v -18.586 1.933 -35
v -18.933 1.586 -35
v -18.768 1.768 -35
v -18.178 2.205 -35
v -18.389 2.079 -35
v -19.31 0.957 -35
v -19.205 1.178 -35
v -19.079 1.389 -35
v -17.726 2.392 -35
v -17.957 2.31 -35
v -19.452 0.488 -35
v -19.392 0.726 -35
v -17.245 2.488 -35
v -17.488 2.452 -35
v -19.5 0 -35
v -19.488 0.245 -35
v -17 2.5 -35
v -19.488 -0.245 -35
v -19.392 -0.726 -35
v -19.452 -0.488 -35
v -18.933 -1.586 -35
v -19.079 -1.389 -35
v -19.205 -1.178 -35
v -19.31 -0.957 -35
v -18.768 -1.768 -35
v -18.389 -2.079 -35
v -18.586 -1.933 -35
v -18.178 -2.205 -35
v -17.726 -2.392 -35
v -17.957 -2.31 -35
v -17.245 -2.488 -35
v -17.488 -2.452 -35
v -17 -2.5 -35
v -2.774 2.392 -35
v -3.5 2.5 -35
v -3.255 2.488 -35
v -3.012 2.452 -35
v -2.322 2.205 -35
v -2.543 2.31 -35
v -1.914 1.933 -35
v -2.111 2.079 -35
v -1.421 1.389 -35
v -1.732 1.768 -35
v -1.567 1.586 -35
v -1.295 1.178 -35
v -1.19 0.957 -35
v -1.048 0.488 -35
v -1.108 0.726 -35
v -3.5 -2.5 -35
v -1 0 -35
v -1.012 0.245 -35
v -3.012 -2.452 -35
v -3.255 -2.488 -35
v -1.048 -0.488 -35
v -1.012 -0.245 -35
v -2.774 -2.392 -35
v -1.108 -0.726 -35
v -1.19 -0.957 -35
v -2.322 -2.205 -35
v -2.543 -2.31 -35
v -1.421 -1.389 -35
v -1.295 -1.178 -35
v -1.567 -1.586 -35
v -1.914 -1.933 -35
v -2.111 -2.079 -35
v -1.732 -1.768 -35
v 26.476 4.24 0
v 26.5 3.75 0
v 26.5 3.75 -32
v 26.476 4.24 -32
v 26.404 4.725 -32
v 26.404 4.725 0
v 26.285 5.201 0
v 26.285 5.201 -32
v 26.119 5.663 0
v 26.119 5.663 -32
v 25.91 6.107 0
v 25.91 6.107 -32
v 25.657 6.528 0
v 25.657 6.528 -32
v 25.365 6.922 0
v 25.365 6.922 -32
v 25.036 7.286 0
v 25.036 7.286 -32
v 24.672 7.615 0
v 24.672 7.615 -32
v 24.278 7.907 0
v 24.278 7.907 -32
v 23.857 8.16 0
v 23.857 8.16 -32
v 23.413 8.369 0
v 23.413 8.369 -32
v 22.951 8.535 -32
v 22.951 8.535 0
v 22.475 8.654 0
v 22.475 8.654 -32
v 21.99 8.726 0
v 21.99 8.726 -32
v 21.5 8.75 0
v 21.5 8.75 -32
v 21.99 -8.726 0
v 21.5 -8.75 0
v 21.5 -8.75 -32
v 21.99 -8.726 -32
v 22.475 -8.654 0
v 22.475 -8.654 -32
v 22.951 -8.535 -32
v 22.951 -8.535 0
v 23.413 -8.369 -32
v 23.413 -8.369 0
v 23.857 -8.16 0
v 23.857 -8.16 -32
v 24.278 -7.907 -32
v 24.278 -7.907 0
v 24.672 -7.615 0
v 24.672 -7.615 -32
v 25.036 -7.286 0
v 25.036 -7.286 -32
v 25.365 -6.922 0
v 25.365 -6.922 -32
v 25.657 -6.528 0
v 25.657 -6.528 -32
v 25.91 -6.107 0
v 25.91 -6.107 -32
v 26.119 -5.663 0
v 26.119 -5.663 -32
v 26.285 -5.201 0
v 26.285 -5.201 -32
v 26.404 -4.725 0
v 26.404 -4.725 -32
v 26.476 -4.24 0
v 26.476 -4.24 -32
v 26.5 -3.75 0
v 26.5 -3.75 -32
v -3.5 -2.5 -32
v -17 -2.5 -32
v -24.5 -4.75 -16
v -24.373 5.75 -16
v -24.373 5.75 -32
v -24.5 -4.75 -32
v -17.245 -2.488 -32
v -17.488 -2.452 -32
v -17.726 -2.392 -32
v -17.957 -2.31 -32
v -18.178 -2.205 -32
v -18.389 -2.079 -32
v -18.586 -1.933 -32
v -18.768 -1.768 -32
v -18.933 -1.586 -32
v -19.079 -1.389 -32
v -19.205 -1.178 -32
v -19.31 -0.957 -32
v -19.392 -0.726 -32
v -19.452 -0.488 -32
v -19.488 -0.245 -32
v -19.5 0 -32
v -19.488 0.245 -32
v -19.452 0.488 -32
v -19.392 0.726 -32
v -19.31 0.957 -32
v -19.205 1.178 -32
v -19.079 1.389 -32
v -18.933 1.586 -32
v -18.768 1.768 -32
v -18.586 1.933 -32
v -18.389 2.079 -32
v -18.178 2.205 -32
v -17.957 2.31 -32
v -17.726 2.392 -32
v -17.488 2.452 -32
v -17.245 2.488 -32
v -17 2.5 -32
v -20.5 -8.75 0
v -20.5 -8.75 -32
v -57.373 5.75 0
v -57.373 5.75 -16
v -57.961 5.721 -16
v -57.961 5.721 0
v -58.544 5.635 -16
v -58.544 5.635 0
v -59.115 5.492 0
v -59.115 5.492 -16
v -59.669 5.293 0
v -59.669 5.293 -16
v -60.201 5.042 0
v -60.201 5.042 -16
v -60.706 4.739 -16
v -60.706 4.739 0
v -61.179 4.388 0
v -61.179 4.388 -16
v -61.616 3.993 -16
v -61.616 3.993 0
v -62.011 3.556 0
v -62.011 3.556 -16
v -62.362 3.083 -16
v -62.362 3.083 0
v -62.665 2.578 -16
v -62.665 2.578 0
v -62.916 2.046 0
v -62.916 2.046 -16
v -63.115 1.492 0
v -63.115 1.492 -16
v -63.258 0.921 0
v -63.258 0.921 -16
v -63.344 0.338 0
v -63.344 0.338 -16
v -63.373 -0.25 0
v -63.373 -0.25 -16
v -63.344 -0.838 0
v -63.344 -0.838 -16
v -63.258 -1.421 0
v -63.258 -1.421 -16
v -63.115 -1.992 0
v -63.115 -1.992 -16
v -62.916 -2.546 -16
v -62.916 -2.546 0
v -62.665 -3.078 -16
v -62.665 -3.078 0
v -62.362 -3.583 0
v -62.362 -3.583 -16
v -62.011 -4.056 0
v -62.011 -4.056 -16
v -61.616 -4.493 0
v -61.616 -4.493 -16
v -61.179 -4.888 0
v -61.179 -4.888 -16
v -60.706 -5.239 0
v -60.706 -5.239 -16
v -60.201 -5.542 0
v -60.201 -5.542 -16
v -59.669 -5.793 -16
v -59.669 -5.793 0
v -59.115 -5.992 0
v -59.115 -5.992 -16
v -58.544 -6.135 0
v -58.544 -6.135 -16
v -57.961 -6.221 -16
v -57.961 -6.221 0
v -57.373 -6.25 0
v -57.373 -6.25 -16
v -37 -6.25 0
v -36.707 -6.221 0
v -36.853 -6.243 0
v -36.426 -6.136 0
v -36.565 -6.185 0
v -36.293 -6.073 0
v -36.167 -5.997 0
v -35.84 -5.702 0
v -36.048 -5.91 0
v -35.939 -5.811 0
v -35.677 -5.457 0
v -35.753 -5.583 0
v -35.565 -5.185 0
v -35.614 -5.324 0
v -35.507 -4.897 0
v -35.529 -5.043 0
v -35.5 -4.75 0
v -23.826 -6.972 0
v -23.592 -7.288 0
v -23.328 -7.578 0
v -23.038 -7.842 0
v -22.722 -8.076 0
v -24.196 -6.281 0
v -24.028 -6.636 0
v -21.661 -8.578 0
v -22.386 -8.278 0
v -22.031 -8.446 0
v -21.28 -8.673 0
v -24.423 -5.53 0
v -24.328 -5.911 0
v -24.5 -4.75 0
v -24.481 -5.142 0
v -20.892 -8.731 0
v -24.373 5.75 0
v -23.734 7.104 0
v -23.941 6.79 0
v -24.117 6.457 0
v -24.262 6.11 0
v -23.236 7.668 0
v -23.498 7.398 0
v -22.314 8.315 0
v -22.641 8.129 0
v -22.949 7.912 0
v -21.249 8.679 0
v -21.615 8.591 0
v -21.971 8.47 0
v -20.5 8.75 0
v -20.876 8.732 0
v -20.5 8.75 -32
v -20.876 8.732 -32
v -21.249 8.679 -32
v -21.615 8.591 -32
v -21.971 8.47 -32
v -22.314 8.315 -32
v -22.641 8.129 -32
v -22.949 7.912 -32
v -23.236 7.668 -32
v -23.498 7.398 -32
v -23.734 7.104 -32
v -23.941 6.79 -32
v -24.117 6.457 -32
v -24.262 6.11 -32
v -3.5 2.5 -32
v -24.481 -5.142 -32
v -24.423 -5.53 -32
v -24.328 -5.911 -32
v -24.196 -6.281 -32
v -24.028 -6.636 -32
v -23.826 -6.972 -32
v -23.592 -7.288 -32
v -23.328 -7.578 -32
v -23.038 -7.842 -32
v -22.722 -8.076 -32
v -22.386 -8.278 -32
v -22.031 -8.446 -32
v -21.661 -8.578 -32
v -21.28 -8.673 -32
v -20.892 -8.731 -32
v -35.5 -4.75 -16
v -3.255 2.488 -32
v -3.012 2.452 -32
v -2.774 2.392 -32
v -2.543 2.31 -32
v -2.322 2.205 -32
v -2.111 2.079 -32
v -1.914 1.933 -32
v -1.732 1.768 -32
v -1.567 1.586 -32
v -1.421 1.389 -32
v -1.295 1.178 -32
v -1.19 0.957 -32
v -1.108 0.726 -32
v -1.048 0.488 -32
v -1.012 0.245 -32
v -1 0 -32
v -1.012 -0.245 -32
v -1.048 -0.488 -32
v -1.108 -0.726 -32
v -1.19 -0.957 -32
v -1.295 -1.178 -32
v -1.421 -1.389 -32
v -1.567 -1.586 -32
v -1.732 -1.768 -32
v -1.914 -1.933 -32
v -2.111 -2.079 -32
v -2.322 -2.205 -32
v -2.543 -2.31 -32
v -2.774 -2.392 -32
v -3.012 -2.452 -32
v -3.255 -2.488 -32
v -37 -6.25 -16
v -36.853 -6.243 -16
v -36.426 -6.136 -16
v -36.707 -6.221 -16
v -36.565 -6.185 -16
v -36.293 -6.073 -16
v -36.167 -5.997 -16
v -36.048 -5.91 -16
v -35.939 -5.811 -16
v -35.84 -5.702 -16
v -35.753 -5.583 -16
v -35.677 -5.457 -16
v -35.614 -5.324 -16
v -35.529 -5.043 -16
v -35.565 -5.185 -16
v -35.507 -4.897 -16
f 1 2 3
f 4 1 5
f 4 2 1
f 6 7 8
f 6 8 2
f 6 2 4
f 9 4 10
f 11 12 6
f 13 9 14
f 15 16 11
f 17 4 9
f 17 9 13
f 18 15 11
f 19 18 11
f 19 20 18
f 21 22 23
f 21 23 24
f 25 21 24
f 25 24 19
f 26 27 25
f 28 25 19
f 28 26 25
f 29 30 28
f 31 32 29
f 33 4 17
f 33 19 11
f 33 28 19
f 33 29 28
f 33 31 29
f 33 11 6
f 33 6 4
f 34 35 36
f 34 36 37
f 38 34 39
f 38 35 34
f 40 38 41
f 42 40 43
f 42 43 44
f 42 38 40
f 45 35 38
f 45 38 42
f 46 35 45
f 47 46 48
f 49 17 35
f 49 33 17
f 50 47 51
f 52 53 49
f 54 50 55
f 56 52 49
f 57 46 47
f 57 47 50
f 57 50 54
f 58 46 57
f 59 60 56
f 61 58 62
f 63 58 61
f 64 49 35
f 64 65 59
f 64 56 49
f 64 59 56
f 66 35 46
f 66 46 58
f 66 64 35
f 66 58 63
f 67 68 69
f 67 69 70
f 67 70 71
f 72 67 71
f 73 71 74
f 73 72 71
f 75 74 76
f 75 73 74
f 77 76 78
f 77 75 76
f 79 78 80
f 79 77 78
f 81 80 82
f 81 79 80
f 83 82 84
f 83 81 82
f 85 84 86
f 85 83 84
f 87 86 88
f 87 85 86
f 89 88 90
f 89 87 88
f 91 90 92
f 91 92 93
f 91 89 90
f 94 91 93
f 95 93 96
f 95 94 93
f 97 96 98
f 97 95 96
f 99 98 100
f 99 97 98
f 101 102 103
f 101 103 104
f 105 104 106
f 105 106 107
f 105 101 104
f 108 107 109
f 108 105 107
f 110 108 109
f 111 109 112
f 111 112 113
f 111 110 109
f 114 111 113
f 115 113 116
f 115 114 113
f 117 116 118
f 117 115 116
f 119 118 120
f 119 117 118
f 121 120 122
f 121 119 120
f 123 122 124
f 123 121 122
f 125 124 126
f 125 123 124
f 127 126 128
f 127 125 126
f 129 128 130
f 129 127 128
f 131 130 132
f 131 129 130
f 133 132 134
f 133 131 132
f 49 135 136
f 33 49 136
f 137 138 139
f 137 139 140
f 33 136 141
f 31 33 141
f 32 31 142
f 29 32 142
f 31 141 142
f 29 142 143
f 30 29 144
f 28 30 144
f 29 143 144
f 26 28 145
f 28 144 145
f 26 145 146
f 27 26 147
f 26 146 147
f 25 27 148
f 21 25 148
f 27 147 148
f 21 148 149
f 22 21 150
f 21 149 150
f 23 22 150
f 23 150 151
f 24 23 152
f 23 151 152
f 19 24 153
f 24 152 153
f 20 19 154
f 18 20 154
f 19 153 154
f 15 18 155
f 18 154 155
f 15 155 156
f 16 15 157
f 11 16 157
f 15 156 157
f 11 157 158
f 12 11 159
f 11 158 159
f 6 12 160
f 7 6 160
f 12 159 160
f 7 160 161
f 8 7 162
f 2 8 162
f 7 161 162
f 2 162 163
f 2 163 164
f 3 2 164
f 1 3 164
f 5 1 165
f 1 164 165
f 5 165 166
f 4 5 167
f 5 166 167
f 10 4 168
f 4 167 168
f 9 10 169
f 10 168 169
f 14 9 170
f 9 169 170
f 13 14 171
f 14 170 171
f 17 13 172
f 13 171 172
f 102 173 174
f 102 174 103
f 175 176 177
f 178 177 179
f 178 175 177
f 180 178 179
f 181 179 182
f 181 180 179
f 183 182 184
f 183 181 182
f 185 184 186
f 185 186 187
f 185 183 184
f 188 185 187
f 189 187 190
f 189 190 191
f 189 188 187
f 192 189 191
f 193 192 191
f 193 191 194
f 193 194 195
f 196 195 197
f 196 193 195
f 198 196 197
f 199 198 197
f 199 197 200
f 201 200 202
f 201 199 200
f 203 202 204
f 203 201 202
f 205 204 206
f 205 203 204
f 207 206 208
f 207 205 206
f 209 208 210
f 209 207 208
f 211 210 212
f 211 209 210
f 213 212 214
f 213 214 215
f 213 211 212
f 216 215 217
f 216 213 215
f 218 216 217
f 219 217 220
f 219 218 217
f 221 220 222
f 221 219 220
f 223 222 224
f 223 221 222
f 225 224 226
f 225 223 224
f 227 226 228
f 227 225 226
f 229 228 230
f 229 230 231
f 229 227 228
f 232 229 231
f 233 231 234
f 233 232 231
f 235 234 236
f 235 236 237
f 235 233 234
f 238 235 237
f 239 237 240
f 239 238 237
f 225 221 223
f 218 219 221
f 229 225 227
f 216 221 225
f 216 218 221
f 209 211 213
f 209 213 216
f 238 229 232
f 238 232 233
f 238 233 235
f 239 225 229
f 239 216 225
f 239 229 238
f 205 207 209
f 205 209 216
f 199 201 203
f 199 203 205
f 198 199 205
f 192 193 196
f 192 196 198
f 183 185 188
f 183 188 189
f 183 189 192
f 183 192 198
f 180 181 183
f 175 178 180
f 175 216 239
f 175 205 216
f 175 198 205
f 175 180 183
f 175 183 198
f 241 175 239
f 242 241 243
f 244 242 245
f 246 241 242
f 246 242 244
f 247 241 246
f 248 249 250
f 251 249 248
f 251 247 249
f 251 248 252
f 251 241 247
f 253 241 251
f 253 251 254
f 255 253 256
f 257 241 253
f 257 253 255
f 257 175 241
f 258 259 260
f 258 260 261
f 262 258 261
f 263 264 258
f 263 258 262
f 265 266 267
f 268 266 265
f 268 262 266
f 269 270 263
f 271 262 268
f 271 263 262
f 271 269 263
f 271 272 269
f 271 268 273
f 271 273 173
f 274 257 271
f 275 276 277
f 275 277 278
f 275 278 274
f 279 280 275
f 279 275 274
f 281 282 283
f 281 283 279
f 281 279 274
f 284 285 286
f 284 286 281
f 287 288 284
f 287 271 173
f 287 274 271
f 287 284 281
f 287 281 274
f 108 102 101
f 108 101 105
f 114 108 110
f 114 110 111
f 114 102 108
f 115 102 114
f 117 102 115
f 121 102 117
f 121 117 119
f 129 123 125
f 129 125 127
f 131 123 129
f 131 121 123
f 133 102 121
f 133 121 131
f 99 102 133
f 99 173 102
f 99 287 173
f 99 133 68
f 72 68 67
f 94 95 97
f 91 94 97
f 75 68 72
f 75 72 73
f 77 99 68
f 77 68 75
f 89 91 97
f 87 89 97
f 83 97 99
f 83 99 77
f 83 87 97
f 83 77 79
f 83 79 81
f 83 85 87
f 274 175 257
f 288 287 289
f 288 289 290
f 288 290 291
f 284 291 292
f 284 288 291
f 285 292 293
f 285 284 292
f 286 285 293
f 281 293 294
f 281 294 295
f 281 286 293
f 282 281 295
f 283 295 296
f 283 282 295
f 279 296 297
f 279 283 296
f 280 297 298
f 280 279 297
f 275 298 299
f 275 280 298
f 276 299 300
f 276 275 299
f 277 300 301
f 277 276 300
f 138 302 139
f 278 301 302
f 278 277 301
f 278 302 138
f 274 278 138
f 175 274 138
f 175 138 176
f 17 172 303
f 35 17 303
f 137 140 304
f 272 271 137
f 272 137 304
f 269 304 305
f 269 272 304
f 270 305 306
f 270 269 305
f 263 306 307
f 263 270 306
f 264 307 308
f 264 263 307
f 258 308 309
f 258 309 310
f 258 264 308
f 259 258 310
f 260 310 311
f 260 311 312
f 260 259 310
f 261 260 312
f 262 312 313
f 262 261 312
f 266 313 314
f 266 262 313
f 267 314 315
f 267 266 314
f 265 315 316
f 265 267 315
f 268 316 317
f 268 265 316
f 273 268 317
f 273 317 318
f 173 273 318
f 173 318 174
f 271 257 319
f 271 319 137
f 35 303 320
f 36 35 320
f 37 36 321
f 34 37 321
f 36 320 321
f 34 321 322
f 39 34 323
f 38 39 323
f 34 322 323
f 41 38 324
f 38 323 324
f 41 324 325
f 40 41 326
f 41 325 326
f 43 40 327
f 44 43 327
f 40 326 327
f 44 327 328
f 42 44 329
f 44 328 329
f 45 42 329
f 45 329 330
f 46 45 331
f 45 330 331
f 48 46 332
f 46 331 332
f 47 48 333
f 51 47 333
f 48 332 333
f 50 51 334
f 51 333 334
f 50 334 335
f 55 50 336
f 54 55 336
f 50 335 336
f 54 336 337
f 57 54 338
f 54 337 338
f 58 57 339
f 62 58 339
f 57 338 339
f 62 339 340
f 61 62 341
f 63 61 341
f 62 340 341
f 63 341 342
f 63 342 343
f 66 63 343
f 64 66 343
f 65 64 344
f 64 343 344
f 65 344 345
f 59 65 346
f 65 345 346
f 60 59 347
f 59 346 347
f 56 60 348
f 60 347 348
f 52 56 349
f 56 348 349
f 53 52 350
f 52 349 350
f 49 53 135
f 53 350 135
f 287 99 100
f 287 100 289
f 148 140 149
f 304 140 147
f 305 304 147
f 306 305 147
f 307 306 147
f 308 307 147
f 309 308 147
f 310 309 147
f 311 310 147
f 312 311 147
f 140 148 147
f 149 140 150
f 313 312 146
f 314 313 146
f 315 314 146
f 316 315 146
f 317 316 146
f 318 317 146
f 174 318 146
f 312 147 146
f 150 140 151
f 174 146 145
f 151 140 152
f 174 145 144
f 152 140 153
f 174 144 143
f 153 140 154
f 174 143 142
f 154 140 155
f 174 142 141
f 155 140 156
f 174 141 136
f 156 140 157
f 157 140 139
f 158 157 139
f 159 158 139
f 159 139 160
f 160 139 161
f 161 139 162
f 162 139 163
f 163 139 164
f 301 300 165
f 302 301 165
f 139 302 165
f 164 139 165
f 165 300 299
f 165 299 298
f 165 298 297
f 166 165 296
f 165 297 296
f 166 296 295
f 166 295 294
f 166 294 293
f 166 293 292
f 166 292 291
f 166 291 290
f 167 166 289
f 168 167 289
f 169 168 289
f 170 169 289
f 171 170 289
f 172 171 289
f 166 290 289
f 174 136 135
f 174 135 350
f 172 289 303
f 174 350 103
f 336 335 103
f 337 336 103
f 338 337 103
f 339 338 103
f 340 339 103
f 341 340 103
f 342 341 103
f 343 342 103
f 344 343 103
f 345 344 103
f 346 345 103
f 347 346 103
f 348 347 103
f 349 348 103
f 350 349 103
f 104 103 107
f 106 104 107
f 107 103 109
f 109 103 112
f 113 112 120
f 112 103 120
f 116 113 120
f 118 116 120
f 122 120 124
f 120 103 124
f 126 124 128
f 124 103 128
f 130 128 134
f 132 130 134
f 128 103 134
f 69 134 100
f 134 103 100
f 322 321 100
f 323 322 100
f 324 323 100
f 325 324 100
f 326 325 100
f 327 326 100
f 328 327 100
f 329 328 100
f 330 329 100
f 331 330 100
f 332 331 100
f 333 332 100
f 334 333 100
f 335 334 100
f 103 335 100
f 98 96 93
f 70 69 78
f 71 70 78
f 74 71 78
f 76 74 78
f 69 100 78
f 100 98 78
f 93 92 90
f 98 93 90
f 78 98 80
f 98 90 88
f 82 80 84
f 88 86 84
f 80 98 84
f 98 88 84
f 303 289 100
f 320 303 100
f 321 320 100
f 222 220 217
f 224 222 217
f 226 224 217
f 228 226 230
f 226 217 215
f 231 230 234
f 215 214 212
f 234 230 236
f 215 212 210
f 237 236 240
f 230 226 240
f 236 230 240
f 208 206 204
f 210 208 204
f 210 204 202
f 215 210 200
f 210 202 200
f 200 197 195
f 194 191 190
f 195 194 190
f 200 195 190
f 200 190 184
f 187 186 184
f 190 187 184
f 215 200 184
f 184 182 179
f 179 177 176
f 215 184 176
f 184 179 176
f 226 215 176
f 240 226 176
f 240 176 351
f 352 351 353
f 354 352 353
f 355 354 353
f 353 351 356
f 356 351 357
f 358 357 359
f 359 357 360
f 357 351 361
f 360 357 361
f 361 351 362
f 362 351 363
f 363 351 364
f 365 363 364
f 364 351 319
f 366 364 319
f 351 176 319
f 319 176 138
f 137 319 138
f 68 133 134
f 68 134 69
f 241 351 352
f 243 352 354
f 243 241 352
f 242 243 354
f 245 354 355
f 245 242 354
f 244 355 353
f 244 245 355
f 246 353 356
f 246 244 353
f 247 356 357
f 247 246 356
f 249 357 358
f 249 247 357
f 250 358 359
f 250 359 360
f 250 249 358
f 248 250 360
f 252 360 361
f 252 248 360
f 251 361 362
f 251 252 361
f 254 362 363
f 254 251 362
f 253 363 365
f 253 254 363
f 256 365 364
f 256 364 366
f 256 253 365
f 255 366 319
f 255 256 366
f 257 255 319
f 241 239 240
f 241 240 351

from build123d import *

# Parameters (mm, degrees)
F1_DEPTH = 32
F2_DEPTH = 16
F4_DEPTH = 3


with BuildPart() as f1:
    # F0 (on Top) → F1 (new body)
    with BuildSketch(Plane.XY):
        with BuildLine():
            Line((21.5, 8.75), (-20.5, 8.75))
            ThreePointArc((-20.5, 8.75), (-22.94949, 7.912278), (-24.372983, 5.75))
            Line((-24.372983, 5.75), (-24.5, -4.75))
            ThreePointArc((-24.5, -4.75), (-23.328427, -7.578427), (-20.5, -8.75))
            Line((-20.5, -8.75), (21.5, -8.75))
            ThreePointArc((21.5, -8.75), (25.035534, -7.285534), (26.5, -3.75))
            Line((26.5, -3.75), (26.5, 3.75))
            ThreePointArc((26.5, 3.75), (25.035534, 7.285534), (21.5, 8.75))
        make_face()
    extrude(amount=-F1_DEPTH)

    # F0 (on Top) → F2 (join)
    with BuildSketch(Plane.XY):
        with BuildLine():
            Line((-24.5, -4.75), (-24.372983, 5.75))
            Line((-24.372983, 5.75), (-57.372983, 5.75))
            ThreePointArc((-57.372983, 5.75), (-63.372983, -0.25), (-57.372983, -6.25))
            Line((-57.372983, -6.25), (-37, -6.25))
            ThreePointArc((-37, -6.25), (-35.93934, -5.81066), (-35.5, -4.75))
            Line((-35.5, -4.75), (-24.5, -4.75))
        make_face()
    extrude(amount=-F2_DEPTH)

    # F3 (on face) → F4 (join)
    with BuildSketch(Plane(origin=(0, 0, -32), x_dir=(1, 0, 0), z_dir=(0, 0, -1))):
        with BuildLine():
            ThreePointArc((-3.5, -2.5), (-1, 0), (-3.5, 2.5))
            Line((-3.5, 2.5), (-17, 2.5))
            ThreePointArc((-17, 2.5), (-19.5, 0), (-17, -2.5))
            Line((-17, -2.5), (-3.5, -2.5))
        make_face()
    extrude(amount=F4_DEPTH)


solid = f1.part
